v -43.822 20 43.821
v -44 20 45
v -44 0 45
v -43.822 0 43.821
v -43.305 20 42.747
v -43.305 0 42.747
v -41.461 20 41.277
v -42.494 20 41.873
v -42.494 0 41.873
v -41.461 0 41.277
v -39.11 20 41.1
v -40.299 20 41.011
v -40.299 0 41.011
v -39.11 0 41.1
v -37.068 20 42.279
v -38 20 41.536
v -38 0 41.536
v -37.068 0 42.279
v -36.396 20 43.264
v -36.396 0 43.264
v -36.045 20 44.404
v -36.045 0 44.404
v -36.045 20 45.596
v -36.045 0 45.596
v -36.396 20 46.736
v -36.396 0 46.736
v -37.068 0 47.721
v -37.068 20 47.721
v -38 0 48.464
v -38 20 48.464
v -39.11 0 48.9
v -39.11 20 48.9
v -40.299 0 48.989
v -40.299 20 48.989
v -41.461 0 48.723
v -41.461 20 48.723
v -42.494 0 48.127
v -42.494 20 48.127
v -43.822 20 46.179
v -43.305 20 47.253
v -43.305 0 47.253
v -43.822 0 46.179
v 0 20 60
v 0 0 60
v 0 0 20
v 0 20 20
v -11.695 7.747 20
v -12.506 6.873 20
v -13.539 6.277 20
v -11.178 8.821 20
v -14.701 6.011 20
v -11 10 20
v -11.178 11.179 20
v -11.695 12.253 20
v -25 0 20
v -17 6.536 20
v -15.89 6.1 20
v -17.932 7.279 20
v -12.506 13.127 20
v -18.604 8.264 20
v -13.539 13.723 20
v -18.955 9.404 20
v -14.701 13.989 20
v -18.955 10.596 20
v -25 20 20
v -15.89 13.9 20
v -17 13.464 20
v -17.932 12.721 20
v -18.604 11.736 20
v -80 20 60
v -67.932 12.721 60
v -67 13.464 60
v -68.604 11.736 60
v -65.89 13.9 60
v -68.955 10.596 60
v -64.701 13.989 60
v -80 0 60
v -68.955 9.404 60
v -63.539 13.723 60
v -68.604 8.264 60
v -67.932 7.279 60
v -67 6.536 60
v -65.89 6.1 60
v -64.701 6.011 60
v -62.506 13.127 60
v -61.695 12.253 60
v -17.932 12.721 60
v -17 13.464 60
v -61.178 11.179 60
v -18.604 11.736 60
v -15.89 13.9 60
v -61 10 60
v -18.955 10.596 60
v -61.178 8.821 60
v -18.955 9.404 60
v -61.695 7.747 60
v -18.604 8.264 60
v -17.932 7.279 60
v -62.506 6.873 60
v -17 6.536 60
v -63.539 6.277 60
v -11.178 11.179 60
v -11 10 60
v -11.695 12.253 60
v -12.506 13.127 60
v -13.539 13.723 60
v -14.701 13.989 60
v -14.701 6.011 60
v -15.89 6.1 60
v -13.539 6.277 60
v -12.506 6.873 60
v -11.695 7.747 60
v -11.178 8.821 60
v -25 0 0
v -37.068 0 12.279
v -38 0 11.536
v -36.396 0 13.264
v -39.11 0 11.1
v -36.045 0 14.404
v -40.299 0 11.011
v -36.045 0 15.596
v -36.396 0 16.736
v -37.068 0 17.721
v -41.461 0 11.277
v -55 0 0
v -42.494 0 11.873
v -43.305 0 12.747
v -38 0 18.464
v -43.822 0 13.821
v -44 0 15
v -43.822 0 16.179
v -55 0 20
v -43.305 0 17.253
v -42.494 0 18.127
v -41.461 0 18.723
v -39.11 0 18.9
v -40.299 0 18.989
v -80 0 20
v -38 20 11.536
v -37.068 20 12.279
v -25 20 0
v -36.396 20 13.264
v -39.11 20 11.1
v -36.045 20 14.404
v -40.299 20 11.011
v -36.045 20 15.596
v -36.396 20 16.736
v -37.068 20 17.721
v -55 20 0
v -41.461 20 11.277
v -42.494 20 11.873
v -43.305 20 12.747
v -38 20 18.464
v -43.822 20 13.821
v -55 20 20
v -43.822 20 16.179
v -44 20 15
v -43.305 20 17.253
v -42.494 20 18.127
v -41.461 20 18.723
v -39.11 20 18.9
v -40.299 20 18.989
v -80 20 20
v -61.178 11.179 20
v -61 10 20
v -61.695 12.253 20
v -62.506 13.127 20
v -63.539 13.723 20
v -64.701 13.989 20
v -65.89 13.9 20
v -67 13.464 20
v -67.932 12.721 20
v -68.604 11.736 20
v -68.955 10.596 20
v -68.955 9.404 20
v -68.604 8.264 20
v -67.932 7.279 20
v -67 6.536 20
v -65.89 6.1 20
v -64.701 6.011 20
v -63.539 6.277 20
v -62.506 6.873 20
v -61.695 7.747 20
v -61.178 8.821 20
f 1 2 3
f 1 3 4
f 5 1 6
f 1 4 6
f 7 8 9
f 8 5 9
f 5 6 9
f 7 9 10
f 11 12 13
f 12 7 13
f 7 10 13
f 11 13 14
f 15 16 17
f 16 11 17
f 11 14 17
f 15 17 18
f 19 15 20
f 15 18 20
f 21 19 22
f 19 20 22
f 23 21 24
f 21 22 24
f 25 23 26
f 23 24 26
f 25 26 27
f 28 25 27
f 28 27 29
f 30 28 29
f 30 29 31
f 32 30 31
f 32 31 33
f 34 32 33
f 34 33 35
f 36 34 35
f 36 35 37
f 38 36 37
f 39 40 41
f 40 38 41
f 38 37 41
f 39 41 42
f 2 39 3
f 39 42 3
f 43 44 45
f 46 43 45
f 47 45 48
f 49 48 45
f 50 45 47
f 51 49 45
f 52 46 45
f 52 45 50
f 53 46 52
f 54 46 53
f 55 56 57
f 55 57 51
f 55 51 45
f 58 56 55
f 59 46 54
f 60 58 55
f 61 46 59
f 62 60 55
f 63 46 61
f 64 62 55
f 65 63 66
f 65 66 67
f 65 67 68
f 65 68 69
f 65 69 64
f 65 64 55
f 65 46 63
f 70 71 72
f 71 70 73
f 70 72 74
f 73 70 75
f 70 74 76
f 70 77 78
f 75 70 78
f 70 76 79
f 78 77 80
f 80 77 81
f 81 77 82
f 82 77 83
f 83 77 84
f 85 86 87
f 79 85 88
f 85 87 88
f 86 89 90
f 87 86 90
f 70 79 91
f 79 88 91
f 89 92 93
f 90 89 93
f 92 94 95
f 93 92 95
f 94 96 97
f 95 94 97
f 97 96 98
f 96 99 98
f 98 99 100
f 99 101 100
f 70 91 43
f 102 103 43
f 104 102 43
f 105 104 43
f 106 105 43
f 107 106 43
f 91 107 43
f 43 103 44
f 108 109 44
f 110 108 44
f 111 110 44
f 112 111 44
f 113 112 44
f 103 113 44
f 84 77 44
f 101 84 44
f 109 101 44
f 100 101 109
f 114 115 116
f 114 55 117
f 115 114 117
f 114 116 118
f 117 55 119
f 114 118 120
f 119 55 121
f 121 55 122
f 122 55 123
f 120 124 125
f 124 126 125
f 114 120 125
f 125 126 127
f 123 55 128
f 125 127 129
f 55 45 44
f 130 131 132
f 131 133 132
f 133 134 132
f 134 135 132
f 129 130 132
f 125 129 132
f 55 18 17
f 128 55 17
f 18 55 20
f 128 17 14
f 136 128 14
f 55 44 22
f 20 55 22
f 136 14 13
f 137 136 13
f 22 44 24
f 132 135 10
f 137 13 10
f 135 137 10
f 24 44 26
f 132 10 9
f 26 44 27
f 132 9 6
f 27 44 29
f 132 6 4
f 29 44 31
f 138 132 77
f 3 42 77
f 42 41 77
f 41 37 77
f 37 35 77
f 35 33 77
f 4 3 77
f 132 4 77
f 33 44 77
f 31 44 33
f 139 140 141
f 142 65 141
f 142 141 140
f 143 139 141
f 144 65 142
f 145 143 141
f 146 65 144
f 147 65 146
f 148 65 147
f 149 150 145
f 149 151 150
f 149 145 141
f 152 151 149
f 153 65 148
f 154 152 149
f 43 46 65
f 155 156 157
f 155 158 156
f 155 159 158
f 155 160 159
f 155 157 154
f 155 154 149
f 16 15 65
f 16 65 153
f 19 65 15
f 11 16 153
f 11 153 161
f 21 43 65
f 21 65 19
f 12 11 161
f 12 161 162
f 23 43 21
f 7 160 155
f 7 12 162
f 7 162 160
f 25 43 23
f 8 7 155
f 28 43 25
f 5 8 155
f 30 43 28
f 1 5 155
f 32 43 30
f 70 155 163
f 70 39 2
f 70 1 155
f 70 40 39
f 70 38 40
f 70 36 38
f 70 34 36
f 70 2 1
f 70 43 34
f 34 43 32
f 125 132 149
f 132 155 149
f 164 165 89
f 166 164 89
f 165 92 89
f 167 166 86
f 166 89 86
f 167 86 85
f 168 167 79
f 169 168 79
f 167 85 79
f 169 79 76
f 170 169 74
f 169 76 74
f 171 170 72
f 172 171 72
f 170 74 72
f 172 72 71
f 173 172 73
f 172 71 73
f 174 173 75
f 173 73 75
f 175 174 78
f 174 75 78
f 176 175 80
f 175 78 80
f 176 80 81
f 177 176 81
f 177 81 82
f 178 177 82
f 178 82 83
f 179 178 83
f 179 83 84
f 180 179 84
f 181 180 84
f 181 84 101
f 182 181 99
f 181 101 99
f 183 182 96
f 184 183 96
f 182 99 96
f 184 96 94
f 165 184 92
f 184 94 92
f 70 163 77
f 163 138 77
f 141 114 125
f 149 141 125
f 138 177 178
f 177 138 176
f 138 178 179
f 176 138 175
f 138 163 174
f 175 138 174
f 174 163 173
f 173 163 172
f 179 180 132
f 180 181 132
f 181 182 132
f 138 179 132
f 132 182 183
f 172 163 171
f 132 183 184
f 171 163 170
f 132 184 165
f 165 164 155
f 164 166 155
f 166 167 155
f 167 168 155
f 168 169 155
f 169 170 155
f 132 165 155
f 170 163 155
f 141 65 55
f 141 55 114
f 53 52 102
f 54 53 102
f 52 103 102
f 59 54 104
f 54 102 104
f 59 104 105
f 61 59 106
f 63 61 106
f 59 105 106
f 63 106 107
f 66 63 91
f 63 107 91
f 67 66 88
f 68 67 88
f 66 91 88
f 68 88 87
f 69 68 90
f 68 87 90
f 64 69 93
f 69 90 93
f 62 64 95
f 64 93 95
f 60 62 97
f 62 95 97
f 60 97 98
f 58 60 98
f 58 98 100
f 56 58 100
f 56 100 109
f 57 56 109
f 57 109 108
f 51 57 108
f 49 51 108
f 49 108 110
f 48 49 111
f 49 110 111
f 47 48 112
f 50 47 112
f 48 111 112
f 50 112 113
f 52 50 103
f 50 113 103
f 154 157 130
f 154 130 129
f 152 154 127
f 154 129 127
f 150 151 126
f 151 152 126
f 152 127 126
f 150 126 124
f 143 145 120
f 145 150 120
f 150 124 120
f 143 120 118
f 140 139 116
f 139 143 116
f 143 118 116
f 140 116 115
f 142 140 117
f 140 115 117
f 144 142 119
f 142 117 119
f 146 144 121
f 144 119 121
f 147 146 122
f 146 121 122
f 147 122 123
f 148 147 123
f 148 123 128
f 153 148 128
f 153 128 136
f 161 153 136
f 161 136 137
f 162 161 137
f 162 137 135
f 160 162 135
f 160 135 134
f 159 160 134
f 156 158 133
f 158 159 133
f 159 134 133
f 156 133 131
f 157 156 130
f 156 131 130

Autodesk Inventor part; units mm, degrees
ref_plane "YZ Plane" through (0, 0, 0) normal (1, 0, 0) x (0, 1, 0)
ref_plane "XZ Plane" through (0, 0, 0) normal (0, 1, 0) x (-1, 0, 0)
ref_plane "XY Plane" through (0, 0, 0) normal (0, 0, 1) x (1, 0, 0)
sketch "Sketch1" plane through (0, 0, 0) normal (0, 1, 0) x (-1, 0, 0)
  line L0 (0, 0) -> (80, 0)
  line L1 (80, 0) -> (80, 60)
  line L2 (80, 60) -> (0, 60)
  line L3 (0, 60) -> (0, 0)
  circle A0 centre (40, 45) radius 4
  circle A1 centre (40, 15) radius 4
  dimension "d0" = 80
  dimension "d1" = 60
  dimension "d4" = 8
  dimension "d5" = 8
extrude "Extrusion1" add sketch "Sketch1" along normal blind 20
sketch "Sketch2" plane through (-80, 0, 60) normal (0, 0, 1) x (1, 0, 0)
  circle A0 centre (15, 10) radius 4
  circle A1 centre (65, 10) radius 4
  dimension "d10" = 8
  dimension "d11" = 8
extrude "Extrusion2" cut sketch "Sketch2" against normal blind 60
sketch "Sketch3" plane through (0, 20, 0) normal (0, 1, 0) x (1, 0, 0)
  line L0 (0, 0) -> (-80, 0) projected
  line L1 (-80, 0) -> (-80, -60) projected
  line L2 (0, -60) -> (0, 0) projected
  line L3 (-40, 0) -> (-25, 0)
  line L4 (-40, 0) -> (-55, 0)
  line L5 (-80, -60) -> (-80, -20)
  line L6 (-80, -20) -> (-55, -20)
  line L7 (-55, -20) -> (-55, 0)
  line L8 (0, -20) -> (-25, -20)
  line L9 (-25, -20) -> (-25, 0)
  dimension "d14" = 15
  dimension "d15" = 15
  dimension "d16" = 40
extrude "Extrusion3" cut sketch "Sketch3" against normal blind 60
properties part number "X_Bottem_MotorSide_V3" material "Birch"
